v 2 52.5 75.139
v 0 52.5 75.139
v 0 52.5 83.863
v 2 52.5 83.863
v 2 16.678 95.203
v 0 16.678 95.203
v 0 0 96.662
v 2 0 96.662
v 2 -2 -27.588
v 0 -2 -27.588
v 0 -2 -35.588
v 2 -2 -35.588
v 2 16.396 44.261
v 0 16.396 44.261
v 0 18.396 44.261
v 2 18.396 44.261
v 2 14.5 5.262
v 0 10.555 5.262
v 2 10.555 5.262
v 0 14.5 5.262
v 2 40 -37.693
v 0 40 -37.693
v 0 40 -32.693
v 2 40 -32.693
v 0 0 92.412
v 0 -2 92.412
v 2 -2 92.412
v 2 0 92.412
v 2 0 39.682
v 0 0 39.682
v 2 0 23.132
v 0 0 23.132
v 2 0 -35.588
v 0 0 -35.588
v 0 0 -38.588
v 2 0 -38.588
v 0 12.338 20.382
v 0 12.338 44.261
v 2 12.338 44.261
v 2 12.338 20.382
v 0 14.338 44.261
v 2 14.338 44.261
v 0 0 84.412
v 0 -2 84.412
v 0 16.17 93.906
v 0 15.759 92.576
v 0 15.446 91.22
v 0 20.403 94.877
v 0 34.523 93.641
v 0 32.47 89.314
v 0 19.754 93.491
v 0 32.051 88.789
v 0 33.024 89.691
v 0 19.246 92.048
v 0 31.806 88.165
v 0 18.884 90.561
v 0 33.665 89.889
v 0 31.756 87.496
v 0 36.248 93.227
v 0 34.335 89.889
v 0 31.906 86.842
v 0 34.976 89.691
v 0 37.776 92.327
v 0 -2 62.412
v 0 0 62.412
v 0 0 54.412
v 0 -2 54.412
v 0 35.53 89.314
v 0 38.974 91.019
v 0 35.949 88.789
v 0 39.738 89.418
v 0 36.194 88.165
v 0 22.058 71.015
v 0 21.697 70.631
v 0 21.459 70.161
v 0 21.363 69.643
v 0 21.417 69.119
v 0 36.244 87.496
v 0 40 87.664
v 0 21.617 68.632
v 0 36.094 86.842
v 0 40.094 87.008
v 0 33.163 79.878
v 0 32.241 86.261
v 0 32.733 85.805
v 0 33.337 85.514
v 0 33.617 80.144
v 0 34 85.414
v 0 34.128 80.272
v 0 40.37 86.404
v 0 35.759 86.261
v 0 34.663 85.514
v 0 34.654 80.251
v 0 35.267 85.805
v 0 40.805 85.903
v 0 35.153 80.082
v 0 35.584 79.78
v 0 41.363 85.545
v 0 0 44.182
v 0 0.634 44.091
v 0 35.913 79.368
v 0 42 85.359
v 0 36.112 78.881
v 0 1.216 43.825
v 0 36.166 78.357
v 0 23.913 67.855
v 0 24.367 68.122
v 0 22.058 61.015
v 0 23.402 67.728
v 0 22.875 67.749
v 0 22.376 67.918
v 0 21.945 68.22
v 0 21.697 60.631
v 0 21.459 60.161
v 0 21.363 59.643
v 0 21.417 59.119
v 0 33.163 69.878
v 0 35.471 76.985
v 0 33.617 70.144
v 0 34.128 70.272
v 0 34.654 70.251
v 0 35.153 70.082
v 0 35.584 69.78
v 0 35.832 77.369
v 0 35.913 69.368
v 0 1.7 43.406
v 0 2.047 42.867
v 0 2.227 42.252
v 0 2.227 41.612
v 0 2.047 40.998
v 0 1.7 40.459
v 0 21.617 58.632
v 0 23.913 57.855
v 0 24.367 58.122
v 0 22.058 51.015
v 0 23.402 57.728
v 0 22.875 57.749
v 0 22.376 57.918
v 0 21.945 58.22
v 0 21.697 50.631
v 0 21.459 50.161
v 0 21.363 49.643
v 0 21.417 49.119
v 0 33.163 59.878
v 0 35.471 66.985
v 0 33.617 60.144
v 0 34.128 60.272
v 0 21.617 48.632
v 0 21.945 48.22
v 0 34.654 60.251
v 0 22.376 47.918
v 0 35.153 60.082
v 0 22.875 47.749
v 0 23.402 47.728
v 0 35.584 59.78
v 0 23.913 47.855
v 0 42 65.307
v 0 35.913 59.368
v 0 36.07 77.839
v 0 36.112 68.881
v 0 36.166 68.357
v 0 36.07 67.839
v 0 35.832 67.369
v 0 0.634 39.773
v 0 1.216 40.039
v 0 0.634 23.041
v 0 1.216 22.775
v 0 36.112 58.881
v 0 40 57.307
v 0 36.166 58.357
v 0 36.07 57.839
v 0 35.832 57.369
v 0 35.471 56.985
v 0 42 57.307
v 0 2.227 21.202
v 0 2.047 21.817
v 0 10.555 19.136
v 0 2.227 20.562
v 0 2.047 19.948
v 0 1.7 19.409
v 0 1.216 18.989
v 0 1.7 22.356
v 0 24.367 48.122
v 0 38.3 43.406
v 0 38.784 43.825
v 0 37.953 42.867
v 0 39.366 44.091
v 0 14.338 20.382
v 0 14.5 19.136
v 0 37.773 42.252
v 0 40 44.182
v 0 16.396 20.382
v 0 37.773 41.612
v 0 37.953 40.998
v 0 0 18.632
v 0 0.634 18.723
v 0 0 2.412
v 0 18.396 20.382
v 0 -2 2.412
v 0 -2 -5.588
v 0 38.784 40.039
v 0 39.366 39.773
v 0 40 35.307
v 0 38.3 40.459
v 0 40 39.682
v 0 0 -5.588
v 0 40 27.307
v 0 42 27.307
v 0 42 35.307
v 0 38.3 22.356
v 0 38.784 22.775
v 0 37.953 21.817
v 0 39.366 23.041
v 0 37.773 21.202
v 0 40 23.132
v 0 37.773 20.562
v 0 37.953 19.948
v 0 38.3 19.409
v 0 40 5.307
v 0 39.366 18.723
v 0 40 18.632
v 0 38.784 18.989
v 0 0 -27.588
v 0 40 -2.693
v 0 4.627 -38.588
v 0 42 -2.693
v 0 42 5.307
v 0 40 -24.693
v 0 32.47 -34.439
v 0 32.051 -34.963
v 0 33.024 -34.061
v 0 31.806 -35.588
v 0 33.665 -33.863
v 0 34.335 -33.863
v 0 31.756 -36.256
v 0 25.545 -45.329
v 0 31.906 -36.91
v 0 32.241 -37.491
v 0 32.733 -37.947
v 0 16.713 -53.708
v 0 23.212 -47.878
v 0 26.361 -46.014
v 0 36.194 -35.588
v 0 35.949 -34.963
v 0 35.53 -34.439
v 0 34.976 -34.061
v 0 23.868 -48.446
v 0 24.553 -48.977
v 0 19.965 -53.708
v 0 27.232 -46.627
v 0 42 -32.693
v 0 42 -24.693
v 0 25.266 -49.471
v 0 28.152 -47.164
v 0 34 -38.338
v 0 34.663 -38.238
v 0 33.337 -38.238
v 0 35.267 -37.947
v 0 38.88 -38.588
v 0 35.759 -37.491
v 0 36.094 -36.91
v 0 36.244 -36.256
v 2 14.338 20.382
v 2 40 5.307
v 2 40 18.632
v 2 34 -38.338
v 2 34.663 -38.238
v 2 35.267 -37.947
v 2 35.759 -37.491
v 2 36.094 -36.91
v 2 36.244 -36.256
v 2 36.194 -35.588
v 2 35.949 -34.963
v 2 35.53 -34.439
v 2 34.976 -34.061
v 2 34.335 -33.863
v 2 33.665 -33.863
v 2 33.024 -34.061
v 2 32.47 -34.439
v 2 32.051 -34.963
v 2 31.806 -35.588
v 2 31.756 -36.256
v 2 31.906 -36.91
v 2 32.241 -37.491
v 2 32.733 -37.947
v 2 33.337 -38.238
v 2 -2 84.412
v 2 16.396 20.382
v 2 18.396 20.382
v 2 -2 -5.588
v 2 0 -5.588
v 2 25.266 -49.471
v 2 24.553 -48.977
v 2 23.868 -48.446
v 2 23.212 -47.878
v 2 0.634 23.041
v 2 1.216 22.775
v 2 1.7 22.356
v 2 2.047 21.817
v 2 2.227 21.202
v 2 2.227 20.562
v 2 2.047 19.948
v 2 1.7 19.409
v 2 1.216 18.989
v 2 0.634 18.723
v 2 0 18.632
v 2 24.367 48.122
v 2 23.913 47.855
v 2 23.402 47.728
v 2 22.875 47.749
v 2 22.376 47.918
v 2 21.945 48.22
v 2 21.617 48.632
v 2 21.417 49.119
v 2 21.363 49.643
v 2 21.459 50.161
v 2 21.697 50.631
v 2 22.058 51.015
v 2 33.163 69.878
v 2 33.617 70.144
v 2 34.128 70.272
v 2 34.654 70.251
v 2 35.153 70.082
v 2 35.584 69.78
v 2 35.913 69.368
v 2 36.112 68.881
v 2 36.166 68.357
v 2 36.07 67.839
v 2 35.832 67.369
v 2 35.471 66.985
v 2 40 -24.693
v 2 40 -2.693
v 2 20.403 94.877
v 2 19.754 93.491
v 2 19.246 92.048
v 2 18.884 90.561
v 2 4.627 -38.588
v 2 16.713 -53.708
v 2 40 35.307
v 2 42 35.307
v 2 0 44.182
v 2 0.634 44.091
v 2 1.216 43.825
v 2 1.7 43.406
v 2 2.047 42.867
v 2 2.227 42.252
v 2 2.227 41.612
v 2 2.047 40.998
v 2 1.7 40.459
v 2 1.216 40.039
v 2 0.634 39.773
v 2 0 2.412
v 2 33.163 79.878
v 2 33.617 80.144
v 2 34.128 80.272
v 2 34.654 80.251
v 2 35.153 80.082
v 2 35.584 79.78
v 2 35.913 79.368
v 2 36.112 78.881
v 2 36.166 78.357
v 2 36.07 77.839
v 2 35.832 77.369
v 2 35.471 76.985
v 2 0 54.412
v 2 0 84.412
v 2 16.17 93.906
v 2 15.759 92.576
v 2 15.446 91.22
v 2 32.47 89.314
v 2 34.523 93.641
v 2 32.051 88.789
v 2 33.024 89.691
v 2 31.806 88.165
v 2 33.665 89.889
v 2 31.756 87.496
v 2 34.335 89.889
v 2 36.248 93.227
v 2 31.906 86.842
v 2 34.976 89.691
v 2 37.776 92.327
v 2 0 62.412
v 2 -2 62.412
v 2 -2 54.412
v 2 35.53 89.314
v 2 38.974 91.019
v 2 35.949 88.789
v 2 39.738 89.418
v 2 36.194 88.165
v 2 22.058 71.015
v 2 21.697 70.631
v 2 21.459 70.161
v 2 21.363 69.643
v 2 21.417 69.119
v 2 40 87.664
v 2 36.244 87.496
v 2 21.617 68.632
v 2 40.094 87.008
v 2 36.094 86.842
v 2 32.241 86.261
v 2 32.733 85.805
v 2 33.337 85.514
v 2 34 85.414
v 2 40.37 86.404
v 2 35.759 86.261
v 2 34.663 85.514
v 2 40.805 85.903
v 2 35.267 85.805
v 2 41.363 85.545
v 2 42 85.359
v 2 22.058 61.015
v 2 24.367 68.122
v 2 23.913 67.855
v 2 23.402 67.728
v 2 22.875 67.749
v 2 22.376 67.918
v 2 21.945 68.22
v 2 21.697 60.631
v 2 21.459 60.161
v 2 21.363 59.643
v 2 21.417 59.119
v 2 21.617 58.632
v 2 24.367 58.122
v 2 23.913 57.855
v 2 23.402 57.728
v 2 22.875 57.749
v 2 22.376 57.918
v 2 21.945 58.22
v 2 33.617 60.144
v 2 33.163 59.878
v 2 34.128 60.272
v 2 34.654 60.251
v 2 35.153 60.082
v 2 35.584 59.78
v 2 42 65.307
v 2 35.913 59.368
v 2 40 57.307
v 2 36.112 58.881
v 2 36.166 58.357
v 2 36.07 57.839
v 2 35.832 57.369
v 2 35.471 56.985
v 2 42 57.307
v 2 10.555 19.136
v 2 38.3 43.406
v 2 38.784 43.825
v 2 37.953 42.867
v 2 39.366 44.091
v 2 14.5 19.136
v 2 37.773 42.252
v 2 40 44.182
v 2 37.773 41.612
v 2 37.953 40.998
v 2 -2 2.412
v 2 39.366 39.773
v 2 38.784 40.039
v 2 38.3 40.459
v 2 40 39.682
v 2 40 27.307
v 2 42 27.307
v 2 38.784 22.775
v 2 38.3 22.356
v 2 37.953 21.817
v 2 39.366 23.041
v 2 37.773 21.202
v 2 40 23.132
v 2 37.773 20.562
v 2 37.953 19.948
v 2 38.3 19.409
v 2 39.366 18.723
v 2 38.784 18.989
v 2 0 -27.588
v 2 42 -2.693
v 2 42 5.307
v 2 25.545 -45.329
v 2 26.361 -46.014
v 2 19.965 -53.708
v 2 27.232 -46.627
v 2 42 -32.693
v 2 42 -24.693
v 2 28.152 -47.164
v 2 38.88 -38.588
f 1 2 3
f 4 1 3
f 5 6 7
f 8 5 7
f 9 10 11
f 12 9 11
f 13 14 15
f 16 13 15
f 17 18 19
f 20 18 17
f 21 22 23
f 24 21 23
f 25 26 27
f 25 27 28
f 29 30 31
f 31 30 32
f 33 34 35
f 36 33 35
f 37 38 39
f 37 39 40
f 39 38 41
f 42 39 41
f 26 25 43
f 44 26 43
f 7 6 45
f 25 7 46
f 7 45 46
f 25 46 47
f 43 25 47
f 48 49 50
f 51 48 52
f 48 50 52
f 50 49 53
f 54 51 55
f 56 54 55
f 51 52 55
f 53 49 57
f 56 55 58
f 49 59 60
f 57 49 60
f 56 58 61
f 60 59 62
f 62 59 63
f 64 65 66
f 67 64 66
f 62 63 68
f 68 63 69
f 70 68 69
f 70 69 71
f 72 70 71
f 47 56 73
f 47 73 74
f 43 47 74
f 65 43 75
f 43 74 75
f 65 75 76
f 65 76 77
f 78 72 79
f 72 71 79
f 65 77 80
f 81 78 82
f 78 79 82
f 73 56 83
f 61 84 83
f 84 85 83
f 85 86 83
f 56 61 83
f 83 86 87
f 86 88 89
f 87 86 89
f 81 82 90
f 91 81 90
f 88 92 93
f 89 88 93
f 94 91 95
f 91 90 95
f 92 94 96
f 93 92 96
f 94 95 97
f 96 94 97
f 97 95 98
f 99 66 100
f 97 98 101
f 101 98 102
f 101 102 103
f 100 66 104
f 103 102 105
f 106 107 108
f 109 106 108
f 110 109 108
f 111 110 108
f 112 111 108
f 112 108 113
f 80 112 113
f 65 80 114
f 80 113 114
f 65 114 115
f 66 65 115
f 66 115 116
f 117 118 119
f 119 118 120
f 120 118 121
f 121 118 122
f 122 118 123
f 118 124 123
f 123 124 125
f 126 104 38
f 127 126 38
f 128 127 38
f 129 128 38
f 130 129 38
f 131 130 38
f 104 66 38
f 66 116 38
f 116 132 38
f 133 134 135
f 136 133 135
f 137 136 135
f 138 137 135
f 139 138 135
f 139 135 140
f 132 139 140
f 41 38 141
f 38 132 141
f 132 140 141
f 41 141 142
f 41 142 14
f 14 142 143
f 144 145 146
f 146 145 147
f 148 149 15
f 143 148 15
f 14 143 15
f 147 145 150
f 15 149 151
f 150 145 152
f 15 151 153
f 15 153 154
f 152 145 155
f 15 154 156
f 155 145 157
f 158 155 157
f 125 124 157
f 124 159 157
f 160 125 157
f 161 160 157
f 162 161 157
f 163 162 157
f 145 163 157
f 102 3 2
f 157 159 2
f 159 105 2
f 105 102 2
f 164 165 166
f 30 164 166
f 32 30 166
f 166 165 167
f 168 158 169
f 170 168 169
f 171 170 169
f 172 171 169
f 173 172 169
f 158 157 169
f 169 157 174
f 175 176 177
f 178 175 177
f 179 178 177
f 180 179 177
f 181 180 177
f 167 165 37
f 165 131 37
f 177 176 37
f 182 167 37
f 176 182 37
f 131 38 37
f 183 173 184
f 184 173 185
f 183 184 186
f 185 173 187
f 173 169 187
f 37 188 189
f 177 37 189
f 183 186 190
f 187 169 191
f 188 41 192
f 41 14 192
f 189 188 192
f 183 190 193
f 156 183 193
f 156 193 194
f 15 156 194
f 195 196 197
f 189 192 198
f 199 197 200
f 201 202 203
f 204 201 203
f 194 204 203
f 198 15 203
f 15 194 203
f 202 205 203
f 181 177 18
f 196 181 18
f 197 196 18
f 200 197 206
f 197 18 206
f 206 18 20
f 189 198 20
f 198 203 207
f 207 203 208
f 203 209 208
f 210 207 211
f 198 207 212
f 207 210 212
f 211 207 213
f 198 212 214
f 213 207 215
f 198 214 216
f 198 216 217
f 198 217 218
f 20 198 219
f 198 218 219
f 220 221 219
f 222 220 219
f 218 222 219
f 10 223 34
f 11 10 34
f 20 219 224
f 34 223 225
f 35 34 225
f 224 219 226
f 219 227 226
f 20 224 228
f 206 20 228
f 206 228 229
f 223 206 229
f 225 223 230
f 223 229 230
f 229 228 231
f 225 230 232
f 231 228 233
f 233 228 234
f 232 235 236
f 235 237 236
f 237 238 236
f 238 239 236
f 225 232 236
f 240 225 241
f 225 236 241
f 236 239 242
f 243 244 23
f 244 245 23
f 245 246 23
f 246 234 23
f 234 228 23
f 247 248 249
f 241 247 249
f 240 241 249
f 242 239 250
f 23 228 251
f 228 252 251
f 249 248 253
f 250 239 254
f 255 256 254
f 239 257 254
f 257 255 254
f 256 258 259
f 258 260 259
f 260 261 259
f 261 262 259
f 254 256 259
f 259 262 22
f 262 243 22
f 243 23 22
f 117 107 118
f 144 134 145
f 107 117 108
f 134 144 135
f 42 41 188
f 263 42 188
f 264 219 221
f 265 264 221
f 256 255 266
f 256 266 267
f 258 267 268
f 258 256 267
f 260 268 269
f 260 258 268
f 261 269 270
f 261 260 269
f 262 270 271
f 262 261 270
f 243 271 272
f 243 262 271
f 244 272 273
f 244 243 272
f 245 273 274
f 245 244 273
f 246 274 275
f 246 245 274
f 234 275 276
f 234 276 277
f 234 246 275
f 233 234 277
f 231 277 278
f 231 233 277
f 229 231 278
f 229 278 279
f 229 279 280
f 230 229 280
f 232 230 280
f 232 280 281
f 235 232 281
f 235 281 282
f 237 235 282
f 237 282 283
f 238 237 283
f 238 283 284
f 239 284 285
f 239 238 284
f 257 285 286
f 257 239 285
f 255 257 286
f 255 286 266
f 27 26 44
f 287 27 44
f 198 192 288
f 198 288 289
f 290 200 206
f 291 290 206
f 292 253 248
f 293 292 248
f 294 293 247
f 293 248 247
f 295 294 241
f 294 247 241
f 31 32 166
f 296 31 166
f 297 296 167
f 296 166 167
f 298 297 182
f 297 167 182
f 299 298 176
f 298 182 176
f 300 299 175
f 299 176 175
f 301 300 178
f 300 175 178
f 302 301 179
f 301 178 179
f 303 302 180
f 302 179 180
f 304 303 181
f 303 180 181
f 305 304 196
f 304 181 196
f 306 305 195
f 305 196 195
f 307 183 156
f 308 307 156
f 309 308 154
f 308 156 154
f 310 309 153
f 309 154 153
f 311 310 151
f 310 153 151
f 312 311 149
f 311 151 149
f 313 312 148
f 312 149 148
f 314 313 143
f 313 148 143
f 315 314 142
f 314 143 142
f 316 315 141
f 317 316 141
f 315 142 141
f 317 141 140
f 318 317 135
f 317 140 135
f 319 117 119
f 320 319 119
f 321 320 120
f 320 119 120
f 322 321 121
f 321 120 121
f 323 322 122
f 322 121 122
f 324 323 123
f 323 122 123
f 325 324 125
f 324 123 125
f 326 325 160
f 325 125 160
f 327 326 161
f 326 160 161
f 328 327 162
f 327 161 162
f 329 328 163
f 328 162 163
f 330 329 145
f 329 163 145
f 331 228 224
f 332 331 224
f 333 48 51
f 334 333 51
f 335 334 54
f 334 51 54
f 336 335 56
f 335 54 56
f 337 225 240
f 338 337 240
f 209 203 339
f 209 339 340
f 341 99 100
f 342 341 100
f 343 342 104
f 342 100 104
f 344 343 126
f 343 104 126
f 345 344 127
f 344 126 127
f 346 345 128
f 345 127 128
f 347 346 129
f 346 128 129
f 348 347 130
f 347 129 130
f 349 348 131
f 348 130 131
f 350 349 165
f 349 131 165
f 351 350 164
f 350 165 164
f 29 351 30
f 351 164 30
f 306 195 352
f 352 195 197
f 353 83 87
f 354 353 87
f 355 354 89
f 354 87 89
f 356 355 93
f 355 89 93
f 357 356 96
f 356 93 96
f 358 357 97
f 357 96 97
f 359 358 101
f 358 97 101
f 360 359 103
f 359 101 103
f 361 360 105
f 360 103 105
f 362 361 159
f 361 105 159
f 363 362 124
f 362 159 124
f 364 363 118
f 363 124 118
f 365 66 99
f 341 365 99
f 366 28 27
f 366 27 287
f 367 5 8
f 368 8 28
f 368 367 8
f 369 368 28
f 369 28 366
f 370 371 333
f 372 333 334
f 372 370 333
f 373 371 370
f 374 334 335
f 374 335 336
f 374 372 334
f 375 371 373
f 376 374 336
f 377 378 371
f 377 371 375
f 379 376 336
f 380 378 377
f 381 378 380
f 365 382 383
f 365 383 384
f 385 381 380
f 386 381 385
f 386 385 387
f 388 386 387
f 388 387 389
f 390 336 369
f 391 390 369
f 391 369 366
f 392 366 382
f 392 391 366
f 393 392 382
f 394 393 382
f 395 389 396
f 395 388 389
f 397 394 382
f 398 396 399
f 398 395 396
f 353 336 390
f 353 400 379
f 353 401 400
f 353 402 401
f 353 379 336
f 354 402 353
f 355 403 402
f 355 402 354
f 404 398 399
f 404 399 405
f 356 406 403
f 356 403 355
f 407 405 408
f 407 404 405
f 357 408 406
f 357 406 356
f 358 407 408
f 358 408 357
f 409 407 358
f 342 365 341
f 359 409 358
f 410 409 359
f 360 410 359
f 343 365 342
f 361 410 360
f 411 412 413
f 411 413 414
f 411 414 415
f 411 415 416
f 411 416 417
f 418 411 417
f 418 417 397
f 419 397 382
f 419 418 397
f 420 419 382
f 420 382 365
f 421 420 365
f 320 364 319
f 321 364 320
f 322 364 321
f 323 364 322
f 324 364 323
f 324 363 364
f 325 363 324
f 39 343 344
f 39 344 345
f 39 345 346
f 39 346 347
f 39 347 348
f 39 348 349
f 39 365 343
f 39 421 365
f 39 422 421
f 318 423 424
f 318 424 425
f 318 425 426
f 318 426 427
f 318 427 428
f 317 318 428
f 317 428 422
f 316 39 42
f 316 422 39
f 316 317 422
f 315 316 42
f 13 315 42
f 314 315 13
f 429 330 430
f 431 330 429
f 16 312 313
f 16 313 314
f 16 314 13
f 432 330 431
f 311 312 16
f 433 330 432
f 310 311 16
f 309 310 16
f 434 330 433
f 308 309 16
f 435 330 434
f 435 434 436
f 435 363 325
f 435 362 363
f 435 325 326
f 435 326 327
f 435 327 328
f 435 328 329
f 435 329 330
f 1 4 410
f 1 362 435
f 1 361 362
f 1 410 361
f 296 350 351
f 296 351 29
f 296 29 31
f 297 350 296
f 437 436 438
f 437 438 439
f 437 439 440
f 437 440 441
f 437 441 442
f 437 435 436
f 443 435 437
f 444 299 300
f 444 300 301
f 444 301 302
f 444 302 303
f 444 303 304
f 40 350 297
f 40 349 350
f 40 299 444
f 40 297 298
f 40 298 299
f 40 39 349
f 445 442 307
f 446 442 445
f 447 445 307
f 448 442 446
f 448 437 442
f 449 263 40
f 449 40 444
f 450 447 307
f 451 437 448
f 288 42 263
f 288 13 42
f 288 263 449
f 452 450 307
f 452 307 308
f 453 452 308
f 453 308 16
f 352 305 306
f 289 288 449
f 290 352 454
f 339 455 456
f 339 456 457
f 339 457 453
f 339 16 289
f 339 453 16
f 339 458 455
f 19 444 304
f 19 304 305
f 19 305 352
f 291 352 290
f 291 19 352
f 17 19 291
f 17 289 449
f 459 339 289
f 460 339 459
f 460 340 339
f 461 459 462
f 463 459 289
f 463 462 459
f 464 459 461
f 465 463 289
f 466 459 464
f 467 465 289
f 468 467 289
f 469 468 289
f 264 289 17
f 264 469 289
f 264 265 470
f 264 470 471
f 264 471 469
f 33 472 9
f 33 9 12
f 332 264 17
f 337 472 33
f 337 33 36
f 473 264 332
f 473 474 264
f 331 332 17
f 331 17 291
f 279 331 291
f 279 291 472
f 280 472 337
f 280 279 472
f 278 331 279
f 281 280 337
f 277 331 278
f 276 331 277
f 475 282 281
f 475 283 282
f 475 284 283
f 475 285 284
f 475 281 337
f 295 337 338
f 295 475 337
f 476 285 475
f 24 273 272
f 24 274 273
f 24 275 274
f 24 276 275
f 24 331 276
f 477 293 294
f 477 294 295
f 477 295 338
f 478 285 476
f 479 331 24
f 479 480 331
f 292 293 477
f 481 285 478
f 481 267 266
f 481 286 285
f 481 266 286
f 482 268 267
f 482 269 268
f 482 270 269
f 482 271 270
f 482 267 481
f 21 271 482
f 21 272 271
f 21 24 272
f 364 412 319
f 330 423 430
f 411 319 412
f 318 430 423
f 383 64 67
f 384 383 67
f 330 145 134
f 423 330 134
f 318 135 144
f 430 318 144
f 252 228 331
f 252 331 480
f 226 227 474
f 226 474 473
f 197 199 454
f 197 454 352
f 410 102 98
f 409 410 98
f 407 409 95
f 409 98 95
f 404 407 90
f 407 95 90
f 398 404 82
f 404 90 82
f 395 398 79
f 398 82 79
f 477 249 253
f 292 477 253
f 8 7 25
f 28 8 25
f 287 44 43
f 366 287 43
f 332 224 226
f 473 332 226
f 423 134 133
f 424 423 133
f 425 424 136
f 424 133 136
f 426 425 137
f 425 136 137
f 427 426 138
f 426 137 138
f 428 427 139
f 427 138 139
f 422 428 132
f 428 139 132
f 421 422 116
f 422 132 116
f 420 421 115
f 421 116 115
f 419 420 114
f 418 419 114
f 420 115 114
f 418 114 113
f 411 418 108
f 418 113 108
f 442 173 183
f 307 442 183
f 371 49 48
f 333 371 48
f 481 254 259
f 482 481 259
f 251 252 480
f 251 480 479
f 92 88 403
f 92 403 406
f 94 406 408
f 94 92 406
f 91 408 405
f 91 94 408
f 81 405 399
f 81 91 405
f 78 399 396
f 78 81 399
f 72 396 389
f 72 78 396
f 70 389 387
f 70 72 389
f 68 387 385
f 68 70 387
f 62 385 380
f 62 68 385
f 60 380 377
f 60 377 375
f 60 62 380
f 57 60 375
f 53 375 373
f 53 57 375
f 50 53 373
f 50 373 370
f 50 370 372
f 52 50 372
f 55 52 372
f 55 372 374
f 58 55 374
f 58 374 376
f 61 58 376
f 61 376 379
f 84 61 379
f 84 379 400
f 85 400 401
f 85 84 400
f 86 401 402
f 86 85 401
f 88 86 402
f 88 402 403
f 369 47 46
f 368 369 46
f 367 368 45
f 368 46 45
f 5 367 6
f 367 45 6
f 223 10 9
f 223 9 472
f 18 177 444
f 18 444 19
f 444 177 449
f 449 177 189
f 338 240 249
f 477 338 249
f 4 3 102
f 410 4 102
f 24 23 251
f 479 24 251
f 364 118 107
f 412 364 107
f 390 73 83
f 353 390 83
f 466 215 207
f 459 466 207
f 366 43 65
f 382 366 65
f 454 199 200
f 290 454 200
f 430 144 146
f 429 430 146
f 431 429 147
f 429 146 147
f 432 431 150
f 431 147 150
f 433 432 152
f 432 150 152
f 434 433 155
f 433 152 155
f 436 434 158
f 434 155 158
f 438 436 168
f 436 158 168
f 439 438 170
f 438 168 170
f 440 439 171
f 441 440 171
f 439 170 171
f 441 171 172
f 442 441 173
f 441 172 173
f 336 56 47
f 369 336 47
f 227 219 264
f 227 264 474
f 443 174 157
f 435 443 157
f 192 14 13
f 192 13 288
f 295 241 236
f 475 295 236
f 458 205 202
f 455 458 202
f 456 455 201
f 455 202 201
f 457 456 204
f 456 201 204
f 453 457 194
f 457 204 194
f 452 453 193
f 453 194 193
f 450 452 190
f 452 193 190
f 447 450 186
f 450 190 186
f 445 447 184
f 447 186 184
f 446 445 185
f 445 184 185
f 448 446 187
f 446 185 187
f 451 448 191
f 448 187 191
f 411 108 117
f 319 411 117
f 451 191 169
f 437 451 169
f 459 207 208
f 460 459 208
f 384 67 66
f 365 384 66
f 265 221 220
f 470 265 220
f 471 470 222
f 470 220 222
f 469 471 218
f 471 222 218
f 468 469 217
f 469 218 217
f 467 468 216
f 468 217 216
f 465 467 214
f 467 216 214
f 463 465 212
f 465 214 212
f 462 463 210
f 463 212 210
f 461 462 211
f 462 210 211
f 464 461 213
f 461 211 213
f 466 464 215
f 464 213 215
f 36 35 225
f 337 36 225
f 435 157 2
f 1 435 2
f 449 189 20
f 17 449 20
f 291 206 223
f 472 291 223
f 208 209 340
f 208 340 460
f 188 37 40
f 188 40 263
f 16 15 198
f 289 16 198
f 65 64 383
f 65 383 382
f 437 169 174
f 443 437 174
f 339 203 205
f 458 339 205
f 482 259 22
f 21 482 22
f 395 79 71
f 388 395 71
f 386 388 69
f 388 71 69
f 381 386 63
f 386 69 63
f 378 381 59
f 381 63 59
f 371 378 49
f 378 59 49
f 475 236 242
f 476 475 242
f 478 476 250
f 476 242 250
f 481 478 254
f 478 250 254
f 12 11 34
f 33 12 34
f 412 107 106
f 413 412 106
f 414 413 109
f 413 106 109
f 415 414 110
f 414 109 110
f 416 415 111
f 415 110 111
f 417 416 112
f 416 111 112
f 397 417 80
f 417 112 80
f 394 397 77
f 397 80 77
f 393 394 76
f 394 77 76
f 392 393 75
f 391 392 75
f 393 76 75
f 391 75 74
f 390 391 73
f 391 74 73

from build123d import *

# Parameters (mm, degrees)
SKETCH_194_W       = 23.879073069
SKETCH_194_H       = 2
SKETCH_194_W_2     = 13.873866224
SKETCH_194_H_2     = 3.944574251
SKETCH_194_R       = 2.25
EXTRUDE_1_DEPTH    = 2
SKETCH_2_W         = 8
SKETCH_2_H         = 2
EXTRUDE_3672_DEPTH = 2


with BuildPart() as part:
    # Sketch 194 → 凸台-拉伸1 (new body)
    with BuildSketch(Plane(origin=(0, 0, 0), x_dir=(0, 0, -1), z_dir=(1, 0, 0))):
        with BuildLine():
            Line((-95.202576637, 16.678130112), (-96.66172395, 0))
            Line((-96.66172395, 0), (-44.182229478, 0))
            ThreePointArc((-44.182229478, 0), (-41.932229478, 2.25), (-39.682229478, 0))
            Line((-39.682229478, 0), (-23.132229478, 0))
            ThreePointArc((-23.132229478, 0), (-20.882229478, 2.25), (-18.632229478, 0))
            Line((-18.632229478, 0), (38.58827605, 0))
            Line((38.58827605, 0), (38.58827605, 4.627371722))
            Line((38.58827605, 4.627371722), (53.708180549, 16.713080595))
            Line((53.708180549, 16.713080595), (53.708180549, 19.964535026))
            Line((53.708180549, 19.964535026), (49.47062371, 25.265958003))
            ThreePointArc((49.47062371, 25.265958003), (48.71615842, 24.206772475), (47.878069959, 23.212438733))
            Line((47.878069959, 23.212438733), (45.32875497, 25.545040291))
            ThreePointArc((45.32875497, 25.545040291), (46.329625978, 26.78976103), (47.163951689, 28.151735001))
            Line((47.163951689, 28.151735001), (38.58827605, 38.88038965))
            Line((38.58827605, 38.88038965), (37.693344157, 40))
            Line((37.693344157, 40), (-18.632229478, 40))
            ThreePointArc((-18.632229478, 40), (-20.882229478, 37.75), (-23.132229478, 40))
            Line((-23.132229478, 40), (-39.682229478, 40))
            ThreePointArc((-39.682229478, 40), (-41.932229478, 37.75), (-44.182229478, 40))
            Line((-44.182229478, 40), (-87.664190365, 40))
            ThreePointArc((-87.664190365, 40), (-91.717731611, 38.423664021), (-93.641358554, 34.522934456))
            Line((-93.641358554, 34.522934456), (-94.87665585, 20.403421746))
            ThreePointArc((-94.87665585, 20.403421746), (-92.775563539, 19.482408503), (-90.560913042, 18.883929203))
            Line((-90.560913042, 18.883929203), (-91.219638908, 15.446476624))
            ThreePointArc((-91.219638908, 15.446476624), (-93.245188063, 15.952094064), (-95.202576637, 16.678130112))
        make_face()
        with Locations((-32.321766012, 13.338077)):
            Rectangle(SKETCH_194_W, SKETCH_194_H, mode=Mode.SUBTRACT)
        with Locations((-32.321766012, 17.395875517)):
            Rectangle(SKETCH_194_W, SKETCH_194_H, mode=Mode.SUBTRACT)
        with Locations((-12.198657062, 12.527713279)):
            Rectangle(SKETCH_194_W_2, SKETCH_194_H_2, mode=Mode.SUBTRACT)
        with BuildLine():
            ThreePointArc((-68.122104991, 24.366829507), (-68.414052328, 21.766100622), (-71.014781213, 22.058047959))
            Line((-71.014781213, 22.058047959), (-79.877790346, 33.162526768))
            ThreePointArc((-79.877790346, 33.162526768), (-79.585843009, 35.763255653), (-76.985114123, 35.471308316))
            Line((-76.985114123, 35.471308316), (-68.122104991, 24.366829507))
        make_face(mode=Mode.SUBTRACT)
        with BuildLine():
            ThreePointArc((-58.122104991, 24.366829507), (-58.414052328, 21.766100622), (-61.014781213, 22.058047959))
            Line((-61.014781213, 22.058047959), (-69.877790346, 33.162526768))
            ThreePointArc((-69.877790346, 33.162526768), (-69.585843009, 35.763255653), (-66.985114123, 35.471308316))
            Line((-66.985114123, 35.471308316), (-58.122104991, 24.366829507))
        make_face(mode=Mode.SUBTRACT)
        with BuildLine():
            ThreePointArc((-48.122104991, 24.366829507), (-48.414052328, 21.766100622), (-51.014781213, 22.058047959))
            Line((-51.014781213, 22.058047959), (-59.877790346, 33.162526768))
            ThreePointArc((-59.877790346, 33.162526768), (-59.585843009, 35.763255653), (-56.985114123, 35.471308316))
            Line((-56.985114123, 35.471308316), (-48.122104991, 24.366829507))
        make_face(mode=Mode.SUBTRACT)
        with Locations((-87.664190365, 34)):
            Circle(SKETCH_194_R, mode=Mode.SUBTRACT)
        with Locations((36.08827605, 34)):
            Circle(SKETCH_194_R, mode=Mode.SUBTRACT)
    extrude(amount=EXTRUDE_1_DEPTH)

    # 草图2 → Extrude 3672 (add)
    with BuildSketch(Plane(origin=(0, 0, 0), x_dir=(0, 0, -1), z_dir=(1, 0, 0))):
        with Locations((31.58827605, -1)):
            Rectangle(SKETCH_2_W, SKETCH_2_H)
        with BuildLine():
            Line((-83.862737476, 52.5), (-85.358986401, 42))
            ThreePointArc((-85.358986401, 42), (-86.138250874, 40.569690448), (-87.664190365, 40))
            Line((-87.664190365, 40), (-65.306655843, 40))
            Line((-65.306655843, 40), (-57.306655843, 40))
            Line((-57.306655843, 40), (-57.306655843, 42))
            Line((-57.306655843, 42), (-65.306655843, 42))
            Line((-65.306655843, 42), (-75.139107316, 52.5))
            Line((-75.139107316, 52.5), (-83.862737476, 52.5))
        make_face()
        with Locations((1.58827605, -1)):
            Rectangle(SKETCH_2_W, SKETCH_2_H)
        with Locations((-58.41172395, -1)):
            Rectangle(SKETCH_2_W, SKETCH_2_H)
        with Locations((-88.41172395, -1)):
            Rectangle(SKETCH_2_W, SKETCH_2_H)
        with Locations((28.693344157, 41)):
            Rectangle(SKETCH_2_W, SKETCH_2_H)
        with Locations((-1.306655843, 41)):
            Rectangle(SKETCH_2_W, SKETCH_2_H)
        with Locations((-31.306655843, 41)):
            Rectangle(SKETCH_2_W, SKETCH_2_H)
    extrude(amount=EXTRUDE_3672_DEPTH)


solid = part.part
